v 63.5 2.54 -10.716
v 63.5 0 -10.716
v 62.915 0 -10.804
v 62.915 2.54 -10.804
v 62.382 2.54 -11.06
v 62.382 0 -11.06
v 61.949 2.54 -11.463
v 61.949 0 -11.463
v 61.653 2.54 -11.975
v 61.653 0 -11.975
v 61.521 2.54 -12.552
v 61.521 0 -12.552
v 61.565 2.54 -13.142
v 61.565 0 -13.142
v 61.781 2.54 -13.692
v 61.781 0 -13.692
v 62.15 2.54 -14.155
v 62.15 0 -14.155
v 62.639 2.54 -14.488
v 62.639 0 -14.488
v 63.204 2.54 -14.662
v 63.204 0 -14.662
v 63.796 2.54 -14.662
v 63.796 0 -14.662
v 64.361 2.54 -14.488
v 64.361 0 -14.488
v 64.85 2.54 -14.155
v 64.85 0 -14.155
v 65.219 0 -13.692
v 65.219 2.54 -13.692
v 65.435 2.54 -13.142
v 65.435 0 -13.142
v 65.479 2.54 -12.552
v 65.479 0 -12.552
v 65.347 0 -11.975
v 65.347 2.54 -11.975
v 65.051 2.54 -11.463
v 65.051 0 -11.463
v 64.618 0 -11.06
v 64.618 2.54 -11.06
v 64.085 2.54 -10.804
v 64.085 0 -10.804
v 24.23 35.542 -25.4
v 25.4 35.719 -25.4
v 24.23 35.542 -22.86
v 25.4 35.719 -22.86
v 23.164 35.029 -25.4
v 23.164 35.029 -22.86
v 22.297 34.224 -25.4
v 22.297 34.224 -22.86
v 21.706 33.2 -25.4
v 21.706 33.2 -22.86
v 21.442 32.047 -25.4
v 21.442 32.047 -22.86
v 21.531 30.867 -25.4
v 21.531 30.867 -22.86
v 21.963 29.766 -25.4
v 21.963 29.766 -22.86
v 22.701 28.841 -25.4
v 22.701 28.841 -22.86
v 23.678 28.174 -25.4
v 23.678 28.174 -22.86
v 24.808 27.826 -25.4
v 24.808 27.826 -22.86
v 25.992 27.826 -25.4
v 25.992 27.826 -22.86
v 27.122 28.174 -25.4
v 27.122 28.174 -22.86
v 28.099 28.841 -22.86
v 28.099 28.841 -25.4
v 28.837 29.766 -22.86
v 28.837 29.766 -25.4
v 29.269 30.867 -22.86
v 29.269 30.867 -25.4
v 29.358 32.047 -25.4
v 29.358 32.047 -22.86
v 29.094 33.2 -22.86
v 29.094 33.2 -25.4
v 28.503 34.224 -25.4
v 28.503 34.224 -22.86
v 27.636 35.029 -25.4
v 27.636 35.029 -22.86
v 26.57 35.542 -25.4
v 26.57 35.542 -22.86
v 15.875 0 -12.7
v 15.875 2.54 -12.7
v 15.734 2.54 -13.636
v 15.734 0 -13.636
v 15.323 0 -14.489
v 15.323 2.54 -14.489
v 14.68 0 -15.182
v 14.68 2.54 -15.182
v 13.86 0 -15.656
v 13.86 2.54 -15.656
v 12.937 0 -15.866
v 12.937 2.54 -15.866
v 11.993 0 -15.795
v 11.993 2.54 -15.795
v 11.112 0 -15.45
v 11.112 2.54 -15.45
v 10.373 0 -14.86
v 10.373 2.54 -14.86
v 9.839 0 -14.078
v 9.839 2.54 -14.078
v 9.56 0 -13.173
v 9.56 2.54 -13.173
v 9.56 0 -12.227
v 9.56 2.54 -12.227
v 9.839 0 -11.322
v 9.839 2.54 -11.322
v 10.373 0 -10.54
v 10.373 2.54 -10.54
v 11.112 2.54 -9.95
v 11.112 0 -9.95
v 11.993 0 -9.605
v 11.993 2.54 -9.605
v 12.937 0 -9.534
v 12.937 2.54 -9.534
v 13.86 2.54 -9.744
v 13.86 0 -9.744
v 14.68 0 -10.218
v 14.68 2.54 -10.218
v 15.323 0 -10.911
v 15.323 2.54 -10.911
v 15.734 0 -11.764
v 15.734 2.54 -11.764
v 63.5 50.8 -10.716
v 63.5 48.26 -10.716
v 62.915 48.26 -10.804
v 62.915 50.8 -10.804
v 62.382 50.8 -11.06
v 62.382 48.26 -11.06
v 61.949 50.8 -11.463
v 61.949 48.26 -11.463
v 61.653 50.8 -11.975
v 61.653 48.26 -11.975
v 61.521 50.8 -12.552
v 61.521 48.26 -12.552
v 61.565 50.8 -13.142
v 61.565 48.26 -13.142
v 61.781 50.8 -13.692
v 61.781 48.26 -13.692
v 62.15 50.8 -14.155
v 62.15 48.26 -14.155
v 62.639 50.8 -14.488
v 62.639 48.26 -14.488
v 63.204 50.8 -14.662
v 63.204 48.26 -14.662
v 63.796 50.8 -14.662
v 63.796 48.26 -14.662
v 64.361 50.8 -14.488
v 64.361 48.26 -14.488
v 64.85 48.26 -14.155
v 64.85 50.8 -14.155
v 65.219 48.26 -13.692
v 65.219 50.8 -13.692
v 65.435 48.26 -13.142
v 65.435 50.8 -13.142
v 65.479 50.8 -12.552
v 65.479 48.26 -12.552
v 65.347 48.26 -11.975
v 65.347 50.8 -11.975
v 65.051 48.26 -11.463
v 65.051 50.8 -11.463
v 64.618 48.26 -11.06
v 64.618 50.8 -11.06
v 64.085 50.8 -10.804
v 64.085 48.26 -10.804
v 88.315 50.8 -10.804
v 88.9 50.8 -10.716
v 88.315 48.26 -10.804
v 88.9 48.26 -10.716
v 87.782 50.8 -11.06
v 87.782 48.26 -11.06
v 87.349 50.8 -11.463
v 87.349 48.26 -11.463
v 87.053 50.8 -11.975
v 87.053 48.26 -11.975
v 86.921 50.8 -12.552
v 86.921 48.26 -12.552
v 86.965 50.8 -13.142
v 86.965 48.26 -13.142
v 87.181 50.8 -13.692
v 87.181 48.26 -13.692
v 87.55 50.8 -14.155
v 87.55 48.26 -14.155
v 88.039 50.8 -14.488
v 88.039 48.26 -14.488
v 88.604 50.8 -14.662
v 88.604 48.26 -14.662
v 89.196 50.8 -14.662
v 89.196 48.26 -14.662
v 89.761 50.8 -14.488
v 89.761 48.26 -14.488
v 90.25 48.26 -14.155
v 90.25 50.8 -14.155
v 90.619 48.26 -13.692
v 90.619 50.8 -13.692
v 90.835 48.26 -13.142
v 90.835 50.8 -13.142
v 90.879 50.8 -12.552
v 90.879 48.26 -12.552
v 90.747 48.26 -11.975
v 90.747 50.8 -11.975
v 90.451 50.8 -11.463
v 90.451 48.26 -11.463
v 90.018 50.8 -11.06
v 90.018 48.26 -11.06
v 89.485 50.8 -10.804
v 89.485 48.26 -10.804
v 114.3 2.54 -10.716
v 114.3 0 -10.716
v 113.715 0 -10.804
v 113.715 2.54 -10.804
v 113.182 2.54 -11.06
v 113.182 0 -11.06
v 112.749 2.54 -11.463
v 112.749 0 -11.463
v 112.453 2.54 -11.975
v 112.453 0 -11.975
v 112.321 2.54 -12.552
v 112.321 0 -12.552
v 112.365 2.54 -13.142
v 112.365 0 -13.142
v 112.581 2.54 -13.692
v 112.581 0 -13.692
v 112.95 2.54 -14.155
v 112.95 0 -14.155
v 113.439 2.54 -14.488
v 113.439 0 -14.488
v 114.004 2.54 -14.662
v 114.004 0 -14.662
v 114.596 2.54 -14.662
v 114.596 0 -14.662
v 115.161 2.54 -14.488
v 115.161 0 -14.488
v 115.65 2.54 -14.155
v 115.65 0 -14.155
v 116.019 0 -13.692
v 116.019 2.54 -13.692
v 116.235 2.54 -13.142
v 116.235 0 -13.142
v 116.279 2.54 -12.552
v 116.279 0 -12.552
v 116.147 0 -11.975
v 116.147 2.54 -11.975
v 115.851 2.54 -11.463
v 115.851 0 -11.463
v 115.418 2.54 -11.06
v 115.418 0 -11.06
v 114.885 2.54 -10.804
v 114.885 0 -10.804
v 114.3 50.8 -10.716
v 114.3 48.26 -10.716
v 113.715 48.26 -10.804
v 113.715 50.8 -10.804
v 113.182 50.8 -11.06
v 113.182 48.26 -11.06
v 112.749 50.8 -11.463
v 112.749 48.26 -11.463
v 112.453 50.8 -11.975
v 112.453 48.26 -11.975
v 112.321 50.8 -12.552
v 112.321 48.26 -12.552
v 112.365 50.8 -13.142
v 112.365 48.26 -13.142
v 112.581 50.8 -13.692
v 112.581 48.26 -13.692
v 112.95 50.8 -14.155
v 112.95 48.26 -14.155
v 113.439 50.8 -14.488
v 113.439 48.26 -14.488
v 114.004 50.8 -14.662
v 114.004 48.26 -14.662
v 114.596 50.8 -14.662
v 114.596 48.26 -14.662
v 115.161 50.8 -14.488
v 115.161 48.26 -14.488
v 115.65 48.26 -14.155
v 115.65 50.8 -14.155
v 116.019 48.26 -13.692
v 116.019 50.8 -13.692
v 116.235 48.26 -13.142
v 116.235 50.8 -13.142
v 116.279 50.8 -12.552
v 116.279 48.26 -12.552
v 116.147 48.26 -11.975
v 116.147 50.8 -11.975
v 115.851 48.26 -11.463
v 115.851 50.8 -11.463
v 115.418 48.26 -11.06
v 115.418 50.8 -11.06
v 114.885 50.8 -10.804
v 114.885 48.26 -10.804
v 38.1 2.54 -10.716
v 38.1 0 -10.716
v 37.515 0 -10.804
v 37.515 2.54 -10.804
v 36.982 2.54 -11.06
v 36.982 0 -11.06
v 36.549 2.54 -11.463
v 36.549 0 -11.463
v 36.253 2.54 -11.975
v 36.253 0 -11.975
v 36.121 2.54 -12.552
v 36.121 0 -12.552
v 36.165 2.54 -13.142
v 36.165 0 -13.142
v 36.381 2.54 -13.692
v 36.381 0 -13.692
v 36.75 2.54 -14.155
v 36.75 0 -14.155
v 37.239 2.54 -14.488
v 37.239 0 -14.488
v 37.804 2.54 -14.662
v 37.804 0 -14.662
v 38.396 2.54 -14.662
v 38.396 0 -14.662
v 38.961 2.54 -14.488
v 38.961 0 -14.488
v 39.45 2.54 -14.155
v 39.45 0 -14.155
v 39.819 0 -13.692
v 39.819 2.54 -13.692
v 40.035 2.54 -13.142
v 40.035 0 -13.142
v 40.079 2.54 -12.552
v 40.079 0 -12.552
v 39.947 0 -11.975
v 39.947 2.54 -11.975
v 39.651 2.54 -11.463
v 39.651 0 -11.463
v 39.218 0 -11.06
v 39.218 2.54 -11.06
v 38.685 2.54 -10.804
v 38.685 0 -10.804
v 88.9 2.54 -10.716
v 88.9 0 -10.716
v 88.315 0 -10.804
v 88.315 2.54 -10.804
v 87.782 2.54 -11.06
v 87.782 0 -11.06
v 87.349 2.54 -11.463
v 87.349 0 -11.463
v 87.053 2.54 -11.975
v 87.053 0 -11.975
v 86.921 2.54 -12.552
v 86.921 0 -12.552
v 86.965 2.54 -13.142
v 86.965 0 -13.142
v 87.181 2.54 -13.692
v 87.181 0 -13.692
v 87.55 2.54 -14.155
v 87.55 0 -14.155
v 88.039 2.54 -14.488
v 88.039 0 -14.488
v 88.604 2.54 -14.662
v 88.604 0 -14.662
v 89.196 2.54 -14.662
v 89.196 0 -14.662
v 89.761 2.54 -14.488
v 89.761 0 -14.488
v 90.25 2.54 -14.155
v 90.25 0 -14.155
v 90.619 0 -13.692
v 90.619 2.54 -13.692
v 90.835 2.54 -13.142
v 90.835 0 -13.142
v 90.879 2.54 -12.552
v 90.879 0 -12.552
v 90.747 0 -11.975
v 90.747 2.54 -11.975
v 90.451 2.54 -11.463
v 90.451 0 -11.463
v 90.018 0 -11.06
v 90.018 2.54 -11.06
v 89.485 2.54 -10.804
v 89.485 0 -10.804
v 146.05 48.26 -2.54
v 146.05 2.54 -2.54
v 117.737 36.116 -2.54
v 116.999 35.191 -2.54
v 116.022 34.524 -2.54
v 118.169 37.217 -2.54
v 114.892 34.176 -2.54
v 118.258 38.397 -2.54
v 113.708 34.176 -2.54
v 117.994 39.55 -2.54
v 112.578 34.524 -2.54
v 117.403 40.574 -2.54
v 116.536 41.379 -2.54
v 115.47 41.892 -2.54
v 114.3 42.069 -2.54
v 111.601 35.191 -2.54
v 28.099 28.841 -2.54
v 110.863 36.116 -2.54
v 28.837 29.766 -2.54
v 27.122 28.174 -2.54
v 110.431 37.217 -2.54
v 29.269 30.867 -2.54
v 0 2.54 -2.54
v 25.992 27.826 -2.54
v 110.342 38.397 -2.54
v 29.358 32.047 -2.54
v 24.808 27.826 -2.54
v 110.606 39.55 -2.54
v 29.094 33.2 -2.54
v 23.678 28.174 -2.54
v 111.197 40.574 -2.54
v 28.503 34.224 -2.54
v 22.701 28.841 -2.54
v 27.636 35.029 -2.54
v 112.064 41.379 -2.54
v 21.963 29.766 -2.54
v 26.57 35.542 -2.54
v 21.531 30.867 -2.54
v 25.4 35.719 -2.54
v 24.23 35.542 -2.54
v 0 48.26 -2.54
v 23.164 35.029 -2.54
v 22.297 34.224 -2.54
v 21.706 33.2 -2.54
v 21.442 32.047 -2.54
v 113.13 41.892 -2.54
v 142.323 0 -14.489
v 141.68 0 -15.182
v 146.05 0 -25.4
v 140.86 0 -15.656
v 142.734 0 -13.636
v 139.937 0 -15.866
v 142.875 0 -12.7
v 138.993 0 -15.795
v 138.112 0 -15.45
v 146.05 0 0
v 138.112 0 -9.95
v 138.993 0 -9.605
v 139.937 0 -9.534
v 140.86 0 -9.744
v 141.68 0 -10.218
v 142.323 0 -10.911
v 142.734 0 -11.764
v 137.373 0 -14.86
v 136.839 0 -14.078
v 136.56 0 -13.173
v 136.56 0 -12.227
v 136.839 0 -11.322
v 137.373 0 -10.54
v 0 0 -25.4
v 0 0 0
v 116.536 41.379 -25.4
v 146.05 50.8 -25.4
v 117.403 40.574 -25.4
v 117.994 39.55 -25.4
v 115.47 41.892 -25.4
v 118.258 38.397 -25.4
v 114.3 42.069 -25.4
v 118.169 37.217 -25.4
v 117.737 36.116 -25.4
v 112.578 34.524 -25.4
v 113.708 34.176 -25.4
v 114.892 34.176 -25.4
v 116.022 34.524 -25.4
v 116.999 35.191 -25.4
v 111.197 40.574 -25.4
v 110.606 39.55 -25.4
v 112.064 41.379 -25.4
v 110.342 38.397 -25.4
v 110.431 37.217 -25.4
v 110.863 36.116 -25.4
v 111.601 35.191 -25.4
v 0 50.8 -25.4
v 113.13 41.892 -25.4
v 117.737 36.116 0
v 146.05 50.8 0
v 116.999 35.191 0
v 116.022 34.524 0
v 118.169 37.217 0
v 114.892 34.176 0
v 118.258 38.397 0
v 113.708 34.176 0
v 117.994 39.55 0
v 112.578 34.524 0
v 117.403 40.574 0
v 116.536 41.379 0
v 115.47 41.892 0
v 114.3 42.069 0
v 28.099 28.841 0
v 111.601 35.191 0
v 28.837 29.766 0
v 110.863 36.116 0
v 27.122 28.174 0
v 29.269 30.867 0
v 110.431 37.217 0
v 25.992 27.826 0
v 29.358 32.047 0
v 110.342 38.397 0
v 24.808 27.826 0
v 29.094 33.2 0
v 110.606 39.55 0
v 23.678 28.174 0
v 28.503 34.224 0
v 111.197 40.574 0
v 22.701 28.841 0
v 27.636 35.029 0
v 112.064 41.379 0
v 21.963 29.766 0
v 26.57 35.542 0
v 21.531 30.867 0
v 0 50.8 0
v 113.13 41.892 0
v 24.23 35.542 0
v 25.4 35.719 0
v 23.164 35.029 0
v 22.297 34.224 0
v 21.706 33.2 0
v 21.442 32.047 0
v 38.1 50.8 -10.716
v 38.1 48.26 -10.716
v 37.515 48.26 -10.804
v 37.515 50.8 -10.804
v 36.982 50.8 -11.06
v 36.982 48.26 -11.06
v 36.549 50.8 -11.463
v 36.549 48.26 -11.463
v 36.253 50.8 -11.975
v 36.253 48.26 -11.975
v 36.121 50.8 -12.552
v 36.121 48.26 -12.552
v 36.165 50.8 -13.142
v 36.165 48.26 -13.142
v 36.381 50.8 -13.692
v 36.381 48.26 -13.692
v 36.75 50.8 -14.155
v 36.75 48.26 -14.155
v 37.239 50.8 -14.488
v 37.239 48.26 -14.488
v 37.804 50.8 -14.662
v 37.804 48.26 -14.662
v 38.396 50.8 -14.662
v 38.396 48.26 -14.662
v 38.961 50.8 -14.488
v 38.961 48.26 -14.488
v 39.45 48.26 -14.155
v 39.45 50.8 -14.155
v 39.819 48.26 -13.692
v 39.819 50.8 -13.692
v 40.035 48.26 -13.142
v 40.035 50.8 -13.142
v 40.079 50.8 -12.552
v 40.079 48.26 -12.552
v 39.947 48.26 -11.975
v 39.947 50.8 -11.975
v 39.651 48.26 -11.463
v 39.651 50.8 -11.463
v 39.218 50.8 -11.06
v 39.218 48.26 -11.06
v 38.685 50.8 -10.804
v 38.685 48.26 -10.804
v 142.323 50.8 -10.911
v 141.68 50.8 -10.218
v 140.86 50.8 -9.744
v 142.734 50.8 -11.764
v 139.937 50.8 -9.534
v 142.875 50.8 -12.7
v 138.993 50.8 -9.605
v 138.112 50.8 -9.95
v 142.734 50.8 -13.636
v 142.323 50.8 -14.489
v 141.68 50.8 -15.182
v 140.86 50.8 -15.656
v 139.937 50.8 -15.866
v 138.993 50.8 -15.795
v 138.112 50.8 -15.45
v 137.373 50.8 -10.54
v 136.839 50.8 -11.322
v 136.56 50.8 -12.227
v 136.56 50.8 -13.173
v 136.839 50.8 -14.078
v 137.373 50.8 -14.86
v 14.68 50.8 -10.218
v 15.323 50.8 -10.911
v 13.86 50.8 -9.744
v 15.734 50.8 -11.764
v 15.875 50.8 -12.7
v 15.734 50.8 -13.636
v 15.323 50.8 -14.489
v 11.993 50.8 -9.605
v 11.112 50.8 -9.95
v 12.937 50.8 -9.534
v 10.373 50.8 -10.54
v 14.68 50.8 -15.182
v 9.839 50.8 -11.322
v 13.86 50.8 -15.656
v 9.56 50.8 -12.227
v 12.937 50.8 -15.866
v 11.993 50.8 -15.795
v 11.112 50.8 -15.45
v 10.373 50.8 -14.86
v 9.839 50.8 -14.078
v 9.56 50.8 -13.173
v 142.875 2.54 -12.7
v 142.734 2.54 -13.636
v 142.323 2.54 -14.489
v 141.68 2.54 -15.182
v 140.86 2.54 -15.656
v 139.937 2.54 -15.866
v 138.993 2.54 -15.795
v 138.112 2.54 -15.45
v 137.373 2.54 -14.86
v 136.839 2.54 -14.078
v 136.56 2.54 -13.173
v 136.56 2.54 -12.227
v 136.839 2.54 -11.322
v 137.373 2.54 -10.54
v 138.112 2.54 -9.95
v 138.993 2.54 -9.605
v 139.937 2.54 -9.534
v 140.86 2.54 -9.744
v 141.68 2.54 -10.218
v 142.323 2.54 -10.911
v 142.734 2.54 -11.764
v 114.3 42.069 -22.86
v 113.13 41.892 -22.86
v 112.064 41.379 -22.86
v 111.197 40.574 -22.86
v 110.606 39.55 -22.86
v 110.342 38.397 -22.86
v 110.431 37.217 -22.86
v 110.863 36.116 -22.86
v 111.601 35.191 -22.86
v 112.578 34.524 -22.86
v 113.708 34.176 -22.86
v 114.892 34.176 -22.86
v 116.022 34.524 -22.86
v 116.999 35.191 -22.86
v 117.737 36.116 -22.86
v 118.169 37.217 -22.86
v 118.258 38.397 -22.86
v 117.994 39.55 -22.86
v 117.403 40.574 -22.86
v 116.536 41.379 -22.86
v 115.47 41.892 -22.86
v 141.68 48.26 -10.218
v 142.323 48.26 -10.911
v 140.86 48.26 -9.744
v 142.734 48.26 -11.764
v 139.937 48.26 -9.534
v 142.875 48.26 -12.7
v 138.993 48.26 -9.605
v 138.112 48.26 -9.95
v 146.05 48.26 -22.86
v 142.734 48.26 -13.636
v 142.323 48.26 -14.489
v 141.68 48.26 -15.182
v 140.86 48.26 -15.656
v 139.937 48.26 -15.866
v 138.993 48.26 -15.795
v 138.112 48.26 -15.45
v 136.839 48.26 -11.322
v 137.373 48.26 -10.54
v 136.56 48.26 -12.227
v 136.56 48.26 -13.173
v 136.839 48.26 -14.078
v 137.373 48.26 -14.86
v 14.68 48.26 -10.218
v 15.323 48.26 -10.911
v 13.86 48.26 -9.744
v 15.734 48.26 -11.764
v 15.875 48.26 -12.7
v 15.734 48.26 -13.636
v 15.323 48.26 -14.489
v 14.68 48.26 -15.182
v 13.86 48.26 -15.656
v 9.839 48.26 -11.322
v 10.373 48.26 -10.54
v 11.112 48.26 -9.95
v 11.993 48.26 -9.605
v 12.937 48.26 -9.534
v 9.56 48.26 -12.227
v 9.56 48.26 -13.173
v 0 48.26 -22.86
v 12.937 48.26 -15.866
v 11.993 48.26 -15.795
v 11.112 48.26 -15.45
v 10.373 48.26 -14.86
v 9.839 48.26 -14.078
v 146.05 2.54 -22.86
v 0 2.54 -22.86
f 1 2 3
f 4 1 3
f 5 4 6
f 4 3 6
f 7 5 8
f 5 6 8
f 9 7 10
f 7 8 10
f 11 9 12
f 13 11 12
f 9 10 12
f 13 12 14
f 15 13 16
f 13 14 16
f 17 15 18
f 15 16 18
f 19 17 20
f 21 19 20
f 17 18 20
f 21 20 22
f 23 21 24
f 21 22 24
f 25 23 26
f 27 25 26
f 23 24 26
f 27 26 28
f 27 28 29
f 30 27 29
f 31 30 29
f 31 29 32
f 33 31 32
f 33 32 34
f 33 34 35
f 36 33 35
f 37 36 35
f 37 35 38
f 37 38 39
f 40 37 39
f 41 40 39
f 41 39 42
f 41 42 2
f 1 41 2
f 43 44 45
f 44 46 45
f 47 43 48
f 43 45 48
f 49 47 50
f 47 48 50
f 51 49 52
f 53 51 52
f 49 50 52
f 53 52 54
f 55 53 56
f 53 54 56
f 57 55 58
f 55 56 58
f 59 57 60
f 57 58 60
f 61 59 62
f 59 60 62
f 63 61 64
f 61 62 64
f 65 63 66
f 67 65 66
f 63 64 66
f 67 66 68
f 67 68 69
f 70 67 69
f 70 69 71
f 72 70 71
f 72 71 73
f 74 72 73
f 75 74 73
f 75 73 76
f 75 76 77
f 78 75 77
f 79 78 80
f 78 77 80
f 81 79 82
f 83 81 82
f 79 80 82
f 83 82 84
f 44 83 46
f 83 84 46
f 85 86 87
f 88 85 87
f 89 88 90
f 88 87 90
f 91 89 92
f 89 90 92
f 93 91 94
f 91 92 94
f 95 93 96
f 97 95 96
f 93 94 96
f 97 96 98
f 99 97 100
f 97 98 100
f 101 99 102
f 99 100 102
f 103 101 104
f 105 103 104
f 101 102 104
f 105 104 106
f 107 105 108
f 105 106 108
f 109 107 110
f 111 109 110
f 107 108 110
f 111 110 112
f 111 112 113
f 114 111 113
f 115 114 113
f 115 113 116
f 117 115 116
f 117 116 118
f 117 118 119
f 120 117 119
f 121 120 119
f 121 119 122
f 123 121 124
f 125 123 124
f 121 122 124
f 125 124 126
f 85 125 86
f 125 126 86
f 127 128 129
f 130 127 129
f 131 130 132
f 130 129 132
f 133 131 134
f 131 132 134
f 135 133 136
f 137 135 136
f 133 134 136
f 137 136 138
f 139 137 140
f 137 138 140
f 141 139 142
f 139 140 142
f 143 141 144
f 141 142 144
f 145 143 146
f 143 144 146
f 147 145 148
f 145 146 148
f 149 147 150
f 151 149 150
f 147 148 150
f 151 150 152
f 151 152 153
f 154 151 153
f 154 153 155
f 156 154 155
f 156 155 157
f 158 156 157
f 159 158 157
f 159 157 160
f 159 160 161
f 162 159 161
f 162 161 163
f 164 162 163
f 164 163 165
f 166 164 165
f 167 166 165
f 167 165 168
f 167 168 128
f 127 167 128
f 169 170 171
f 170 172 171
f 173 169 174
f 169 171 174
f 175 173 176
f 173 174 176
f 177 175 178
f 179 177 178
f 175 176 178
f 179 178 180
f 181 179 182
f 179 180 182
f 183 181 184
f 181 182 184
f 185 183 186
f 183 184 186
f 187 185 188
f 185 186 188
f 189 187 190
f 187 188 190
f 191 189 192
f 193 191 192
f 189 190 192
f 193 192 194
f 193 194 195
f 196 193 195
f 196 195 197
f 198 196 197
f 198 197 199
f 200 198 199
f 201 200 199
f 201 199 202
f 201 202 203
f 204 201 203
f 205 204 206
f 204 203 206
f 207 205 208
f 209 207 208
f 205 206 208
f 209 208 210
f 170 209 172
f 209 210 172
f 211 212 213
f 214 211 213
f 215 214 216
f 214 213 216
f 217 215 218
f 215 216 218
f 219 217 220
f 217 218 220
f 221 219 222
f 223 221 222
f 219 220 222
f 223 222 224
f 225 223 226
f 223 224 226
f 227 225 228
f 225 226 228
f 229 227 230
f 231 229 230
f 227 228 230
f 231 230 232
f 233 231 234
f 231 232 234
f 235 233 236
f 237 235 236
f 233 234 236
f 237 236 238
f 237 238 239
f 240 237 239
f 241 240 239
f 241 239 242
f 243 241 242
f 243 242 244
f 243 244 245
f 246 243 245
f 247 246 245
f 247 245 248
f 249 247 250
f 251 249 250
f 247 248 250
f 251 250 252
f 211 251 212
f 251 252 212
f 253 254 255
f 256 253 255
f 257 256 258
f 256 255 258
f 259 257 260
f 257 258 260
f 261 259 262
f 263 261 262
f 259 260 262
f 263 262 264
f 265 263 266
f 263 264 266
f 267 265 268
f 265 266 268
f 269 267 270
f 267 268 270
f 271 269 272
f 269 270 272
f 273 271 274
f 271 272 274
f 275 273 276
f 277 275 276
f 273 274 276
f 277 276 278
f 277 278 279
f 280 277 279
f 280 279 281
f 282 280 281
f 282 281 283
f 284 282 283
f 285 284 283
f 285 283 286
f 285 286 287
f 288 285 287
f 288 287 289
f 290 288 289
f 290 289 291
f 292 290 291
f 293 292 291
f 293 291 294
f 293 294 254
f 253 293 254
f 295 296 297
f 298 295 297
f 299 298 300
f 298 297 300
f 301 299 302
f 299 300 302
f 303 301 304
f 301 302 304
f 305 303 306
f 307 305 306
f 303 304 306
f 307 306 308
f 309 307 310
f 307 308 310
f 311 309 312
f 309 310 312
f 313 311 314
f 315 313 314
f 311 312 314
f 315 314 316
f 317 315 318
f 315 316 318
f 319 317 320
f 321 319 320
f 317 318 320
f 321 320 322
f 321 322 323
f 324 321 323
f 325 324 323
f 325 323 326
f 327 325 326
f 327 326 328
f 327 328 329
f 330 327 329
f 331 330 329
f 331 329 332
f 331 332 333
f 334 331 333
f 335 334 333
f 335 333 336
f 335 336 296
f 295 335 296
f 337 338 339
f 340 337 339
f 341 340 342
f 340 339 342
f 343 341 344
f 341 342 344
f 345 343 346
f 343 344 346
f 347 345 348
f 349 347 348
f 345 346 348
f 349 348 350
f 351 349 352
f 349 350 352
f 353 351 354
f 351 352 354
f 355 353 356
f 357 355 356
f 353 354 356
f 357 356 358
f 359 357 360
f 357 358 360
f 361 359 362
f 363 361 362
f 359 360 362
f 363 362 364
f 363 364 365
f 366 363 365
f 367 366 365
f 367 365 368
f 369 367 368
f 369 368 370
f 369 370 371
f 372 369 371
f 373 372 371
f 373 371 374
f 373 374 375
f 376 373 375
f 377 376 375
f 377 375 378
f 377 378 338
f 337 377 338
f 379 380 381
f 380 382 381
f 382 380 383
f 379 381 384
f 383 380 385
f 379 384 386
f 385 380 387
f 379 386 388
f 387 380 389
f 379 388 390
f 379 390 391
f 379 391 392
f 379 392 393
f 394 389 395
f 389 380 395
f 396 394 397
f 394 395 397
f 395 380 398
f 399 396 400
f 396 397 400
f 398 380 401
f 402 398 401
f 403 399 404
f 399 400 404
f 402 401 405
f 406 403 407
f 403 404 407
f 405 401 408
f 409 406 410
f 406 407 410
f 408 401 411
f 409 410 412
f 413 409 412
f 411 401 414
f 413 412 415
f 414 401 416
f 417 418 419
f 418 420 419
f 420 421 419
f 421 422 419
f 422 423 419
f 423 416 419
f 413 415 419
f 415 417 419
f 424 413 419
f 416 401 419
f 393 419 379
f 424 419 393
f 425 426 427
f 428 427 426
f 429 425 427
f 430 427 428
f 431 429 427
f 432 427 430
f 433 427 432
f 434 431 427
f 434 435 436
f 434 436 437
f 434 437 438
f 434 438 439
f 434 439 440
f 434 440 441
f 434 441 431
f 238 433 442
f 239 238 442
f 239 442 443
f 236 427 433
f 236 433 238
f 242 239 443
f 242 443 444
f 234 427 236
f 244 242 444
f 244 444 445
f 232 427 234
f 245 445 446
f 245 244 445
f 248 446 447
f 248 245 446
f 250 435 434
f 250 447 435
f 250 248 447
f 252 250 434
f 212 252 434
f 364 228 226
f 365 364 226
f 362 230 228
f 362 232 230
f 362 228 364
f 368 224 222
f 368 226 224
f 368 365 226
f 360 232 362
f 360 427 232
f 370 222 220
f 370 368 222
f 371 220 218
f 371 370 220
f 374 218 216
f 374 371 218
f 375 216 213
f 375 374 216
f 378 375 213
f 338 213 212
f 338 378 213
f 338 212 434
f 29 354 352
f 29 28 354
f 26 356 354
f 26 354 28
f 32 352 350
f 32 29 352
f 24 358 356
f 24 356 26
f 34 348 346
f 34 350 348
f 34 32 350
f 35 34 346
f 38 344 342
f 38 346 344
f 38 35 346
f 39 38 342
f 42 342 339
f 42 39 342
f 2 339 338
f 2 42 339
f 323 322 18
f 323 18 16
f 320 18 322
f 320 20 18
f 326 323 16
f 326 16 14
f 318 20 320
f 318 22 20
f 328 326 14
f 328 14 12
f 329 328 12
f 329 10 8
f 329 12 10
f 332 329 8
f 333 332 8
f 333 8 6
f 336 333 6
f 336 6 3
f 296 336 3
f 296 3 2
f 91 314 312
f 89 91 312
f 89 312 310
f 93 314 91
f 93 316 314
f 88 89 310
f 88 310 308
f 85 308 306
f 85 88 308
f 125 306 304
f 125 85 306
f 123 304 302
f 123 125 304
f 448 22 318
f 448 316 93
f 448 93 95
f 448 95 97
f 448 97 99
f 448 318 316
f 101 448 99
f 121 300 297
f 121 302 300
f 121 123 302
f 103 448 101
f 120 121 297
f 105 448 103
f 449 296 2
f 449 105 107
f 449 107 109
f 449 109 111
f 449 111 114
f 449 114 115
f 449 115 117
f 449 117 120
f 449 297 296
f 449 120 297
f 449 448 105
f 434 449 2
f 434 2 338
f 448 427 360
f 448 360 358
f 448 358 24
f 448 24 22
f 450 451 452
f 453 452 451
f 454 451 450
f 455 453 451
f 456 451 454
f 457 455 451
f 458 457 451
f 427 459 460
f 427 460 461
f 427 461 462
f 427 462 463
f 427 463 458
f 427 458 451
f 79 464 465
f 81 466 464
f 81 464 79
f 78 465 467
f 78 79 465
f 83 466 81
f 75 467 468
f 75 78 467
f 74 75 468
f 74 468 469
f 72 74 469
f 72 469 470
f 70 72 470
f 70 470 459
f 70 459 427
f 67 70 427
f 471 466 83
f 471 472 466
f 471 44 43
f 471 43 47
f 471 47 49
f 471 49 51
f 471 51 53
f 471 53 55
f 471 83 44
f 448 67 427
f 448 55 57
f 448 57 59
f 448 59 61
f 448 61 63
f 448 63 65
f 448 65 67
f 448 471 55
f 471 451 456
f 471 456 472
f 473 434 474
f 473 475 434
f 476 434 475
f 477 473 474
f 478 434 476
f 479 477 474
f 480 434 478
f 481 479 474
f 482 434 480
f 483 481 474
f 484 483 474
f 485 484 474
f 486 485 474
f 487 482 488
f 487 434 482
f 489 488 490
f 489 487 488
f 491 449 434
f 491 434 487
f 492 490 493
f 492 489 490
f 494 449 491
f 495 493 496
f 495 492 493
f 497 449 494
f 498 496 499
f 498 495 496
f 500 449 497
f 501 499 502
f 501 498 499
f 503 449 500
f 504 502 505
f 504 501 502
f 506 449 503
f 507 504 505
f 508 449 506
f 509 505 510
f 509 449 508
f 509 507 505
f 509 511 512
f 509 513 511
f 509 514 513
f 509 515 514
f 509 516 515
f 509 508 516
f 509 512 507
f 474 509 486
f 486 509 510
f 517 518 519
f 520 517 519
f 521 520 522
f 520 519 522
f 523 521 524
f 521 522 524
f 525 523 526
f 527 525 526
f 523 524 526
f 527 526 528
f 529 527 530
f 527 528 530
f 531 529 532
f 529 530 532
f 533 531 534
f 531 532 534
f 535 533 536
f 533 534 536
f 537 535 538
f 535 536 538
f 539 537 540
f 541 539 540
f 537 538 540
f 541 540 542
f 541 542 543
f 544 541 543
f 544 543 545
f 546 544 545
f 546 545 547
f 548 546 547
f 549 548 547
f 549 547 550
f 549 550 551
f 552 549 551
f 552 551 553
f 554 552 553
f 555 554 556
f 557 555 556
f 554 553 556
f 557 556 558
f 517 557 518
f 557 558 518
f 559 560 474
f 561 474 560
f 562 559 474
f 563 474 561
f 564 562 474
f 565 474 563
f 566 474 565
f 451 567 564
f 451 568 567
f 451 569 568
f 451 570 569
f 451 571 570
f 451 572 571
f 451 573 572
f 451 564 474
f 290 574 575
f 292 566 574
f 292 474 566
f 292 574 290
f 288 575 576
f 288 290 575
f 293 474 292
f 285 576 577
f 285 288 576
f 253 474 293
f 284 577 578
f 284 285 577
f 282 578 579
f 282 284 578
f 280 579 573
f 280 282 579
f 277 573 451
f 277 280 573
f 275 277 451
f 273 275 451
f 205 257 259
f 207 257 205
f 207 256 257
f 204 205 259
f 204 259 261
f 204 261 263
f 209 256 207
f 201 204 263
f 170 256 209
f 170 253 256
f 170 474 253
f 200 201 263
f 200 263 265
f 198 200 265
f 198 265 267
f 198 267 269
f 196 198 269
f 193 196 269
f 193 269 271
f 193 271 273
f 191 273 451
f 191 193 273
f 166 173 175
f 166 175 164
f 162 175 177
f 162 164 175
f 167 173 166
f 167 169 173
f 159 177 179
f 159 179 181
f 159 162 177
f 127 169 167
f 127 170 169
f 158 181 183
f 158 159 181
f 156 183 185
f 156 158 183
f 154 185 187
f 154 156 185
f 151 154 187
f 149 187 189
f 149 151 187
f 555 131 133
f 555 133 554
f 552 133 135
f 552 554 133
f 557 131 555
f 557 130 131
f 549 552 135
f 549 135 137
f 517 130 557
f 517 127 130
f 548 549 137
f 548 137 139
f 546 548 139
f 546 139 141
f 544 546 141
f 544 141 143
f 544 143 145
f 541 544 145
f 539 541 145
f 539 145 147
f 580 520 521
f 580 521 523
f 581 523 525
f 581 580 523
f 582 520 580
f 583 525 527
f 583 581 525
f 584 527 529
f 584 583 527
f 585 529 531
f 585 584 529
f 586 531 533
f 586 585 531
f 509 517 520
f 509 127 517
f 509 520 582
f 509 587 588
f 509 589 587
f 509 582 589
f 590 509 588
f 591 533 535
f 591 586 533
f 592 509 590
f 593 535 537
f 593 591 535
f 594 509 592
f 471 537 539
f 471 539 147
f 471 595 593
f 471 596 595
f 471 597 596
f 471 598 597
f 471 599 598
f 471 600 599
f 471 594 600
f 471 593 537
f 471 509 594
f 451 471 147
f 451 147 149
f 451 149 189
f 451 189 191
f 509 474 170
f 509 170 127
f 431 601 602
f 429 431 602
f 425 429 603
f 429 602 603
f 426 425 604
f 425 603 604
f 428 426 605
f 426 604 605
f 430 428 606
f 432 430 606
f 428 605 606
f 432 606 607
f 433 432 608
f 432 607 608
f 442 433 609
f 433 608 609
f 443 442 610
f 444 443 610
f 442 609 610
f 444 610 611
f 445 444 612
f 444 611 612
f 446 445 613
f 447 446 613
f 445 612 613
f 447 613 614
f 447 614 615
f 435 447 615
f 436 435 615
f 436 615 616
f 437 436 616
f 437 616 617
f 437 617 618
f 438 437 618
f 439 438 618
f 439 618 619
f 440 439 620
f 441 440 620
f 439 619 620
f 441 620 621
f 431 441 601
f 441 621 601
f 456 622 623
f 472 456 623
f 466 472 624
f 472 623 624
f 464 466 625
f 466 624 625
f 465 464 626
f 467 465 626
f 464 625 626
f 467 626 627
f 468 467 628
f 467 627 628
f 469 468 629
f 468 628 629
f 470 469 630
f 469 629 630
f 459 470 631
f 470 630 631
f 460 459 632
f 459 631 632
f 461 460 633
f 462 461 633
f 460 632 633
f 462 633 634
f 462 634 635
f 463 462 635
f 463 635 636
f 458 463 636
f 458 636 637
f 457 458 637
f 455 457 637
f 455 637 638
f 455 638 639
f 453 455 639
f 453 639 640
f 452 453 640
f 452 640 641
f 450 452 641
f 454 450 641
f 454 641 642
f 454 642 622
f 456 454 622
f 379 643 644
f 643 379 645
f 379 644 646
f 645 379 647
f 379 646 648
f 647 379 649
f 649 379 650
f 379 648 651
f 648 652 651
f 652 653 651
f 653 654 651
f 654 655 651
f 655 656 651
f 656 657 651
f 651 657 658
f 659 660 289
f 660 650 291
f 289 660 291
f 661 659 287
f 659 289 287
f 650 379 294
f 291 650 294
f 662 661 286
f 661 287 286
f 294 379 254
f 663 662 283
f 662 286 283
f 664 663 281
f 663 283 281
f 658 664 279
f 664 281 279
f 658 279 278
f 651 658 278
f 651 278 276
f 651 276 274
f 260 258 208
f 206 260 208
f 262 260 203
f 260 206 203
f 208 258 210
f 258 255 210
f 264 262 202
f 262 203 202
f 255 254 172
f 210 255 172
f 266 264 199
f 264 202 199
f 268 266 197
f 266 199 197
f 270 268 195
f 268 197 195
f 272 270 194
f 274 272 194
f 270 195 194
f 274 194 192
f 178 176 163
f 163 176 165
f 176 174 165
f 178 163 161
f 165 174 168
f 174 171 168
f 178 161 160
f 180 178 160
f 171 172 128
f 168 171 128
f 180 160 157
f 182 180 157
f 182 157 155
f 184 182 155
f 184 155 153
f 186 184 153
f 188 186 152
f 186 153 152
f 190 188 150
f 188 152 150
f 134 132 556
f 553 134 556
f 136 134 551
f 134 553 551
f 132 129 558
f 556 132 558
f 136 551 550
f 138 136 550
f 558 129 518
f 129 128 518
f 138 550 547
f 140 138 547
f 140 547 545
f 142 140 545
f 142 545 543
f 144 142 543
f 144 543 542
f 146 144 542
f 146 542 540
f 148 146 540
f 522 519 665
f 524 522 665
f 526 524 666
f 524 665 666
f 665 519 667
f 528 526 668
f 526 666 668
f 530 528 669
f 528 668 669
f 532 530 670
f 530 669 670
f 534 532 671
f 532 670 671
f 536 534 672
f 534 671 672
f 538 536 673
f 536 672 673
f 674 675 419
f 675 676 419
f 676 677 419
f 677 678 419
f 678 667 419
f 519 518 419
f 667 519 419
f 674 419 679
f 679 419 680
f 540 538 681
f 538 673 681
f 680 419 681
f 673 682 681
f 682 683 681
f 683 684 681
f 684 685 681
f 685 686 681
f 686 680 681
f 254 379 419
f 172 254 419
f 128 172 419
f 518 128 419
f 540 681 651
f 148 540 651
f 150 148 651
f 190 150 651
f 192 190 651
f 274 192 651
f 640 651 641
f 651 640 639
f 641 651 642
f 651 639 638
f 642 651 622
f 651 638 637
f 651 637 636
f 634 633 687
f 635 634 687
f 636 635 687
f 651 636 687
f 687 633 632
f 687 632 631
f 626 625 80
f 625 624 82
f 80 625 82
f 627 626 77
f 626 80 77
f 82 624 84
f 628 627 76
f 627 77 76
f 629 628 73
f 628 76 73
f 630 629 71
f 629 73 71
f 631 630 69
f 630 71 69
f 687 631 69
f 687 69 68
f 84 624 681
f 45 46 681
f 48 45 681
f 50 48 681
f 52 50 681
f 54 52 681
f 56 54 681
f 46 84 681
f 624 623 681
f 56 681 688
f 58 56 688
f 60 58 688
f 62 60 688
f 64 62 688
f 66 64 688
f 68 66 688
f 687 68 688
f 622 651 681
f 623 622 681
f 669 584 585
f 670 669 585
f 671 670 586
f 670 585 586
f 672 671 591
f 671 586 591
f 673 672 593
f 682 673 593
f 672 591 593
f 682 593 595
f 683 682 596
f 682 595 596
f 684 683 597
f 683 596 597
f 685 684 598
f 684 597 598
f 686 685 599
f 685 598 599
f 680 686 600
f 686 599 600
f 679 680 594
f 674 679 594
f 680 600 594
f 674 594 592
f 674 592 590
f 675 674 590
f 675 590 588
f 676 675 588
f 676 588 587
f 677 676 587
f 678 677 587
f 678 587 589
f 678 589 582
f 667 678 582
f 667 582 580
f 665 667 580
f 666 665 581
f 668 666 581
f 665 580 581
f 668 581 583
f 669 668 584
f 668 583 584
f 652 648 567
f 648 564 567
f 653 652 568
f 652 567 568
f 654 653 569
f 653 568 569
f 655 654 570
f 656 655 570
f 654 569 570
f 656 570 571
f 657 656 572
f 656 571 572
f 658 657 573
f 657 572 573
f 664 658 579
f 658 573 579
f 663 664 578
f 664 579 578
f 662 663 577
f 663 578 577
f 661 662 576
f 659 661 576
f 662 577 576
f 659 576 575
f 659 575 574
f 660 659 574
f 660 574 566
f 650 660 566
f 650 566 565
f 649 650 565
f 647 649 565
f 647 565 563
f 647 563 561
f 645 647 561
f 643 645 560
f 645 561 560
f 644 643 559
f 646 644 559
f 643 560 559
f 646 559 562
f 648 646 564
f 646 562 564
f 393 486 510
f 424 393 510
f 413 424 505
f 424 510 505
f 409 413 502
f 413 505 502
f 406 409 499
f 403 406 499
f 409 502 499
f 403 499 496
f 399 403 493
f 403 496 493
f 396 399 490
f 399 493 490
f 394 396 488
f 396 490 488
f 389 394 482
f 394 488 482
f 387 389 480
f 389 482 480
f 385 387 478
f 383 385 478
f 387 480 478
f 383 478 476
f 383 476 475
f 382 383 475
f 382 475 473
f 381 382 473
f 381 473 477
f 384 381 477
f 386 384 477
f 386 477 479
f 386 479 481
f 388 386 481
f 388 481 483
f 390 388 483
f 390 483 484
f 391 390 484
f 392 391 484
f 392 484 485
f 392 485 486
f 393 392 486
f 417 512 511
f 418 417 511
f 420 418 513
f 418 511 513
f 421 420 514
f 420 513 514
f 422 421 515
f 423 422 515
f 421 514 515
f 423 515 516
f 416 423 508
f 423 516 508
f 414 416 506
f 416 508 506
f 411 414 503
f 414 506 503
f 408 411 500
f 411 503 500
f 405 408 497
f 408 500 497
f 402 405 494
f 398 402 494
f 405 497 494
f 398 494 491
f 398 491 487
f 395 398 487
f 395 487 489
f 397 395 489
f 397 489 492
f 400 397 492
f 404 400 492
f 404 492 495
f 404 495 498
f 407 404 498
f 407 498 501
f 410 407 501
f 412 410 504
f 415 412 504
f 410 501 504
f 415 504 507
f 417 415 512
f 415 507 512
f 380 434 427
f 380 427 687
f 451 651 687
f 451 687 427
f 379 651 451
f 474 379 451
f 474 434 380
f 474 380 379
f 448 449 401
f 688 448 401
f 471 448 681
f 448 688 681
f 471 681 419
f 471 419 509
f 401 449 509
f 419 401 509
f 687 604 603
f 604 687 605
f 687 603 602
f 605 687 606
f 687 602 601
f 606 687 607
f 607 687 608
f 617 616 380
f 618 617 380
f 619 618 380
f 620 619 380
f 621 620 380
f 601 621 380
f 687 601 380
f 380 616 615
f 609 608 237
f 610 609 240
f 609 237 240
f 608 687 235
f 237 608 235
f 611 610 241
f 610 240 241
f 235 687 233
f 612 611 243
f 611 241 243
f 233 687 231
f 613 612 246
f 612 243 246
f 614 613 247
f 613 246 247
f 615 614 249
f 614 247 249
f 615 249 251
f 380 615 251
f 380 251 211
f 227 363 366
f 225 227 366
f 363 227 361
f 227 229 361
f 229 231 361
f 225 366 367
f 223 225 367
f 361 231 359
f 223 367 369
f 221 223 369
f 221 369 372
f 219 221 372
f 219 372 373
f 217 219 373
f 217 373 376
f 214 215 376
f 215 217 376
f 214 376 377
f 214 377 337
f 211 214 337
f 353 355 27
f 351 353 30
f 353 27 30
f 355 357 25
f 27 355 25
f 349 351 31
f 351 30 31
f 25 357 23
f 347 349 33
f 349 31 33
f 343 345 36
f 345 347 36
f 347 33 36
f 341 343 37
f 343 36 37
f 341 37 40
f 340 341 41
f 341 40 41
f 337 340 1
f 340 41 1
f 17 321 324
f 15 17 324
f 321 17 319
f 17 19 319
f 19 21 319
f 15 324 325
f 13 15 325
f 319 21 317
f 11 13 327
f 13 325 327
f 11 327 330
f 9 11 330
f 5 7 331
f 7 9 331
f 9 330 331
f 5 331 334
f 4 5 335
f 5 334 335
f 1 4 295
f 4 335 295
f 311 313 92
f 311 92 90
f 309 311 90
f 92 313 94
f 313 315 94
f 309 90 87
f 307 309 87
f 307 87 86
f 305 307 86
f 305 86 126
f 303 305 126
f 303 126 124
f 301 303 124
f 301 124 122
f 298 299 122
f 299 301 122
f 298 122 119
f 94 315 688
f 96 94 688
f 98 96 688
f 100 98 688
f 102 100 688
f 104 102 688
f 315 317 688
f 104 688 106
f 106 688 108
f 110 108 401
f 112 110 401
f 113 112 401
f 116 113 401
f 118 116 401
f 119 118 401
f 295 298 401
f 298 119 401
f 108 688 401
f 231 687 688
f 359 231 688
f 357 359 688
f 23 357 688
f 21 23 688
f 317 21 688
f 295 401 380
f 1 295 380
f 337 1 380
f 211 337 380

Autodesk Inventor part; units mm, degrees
ref_plane "YZ Plane" through (0, 0, 0) normal (1, 0, 0) x (0, 1, 0)
ref_plane "XZ Plane" through (0, 0, 0) normal (0, 1, 0) x (-1, 0, 0)
ref_plane "XY Plane" through (0, 0, 0) normal (0, 0, 1) x (1, 0, 0)
sketch "Sketch1" plane through (0, 0, 0) normal (1, 0, 0) x (0, 1, 0)
  line L0 (0, 0) -> (50.8, 0)
  line L1 (50.8, 0) -> (50.8, -25.4)
  line L2 (50.8, -25.4) -> (0, -25.4)
  line L3 (0, -25.4) -> (0, 0)
  line L4 (2.54, -2.54) -> (48.26, -2.54)
  line L5 (48.26, -2.54) -> (48.26, -22.86)
  line L6 (48.26, -22.86) -> (2.54, -22.86)
  line L7 (2.54, -22.86) -> (2.54, -2.54)
  dimension "d0" = 50.8
  dimension "d1" = 25.4
  dimension "d2" = 45.72
  dimension "d3" = 20.32
  dimension "d4" = 2.54
  dimension "d5" = 2.54
extrude "Extrusion1" add sketch "Sketch1" along normal blind 146.05
sketch "Sketch5" plane through (0, 50.8, 0) normal (0, 1, 0) x (1, 0, 0)
  line L0 (0, 0) -> (0, 25.4) projected
  line L1 (0, 0) -> (146.05, 0) projected
  line L2 (146.05, 25.4) -> (146.05, 0) projected
  line L3 (0, 25.4) -> (146.05, 25.4) projected
  point P0 (12.7, 12.7)
  dimension "d39" = 12.7
  dimension "d40" = 12.7
hole "Hole3" at (12.7, 50.8, -12.7) direction (0, -1, 0) diameter 3.9688 end through all
pattern_linear "Rectangular Pattern1" count 6 spacing 25.4 along (1, 0, 0) of "Hole3"
sketch "Sketch6" plane through (0, 0, -25.4) normal (0, 0, -1) x (-1, 0, 0)
  line L0 (0, 50.8) -> (0, 0) projected
  line L1 (0, 50.8) -> (-146.05, 50.8) projected
  line L2 (-146.05, 0) -> (-146.05, 50.8) projected
  line L3 (0, 0) -> (-146.05, 0) projected
  point P0 (-114.3, 38.1)
  dimension "d51" = 12.7
  dimension "d52" = 31.75
hole "Hole4" at (114.3, 38.1, -25.4) direction (0, 0, 1) diameter 7.9375 end through all
sketch "Sketch7" plane through (0, 50.8, 0) normal (0, 1, 0) x (1, 0, 0)
  circle A0 centre (139.7, 12.7) radius 1.9844 projected
  circle A1 centre (114.3, 12.7) radius 1.9844 projected
  circle A2 centre (88.9, 12.7) radius 1.9844 projected
  circle A3 centre (63.5, 12.7) radius 1.9844 projected
  circle A4 centre (38.1, 12.7) radius 1.9844 projected
  circle A5 centre (12.7, 12.7) radius 1.9844 projected
  line L0 (0, 0) -> (0, 25.4) projected
  line L1 (0, 0) -> (146.05, 0) projected
  line L2 (146.05, 25.4) -> (146.05, 0) projected
  line L3 (0, 25.4) -> (146.05, 25.4) projected
  circle A6 centre (12.7, 12.7) radius 1.9844 projected
  circle A7 centre (12.7, 12.7) radius 3.175
  circle A8 centre (139.7, 12.7) radius 3.175
  dimension "d60" = 6.35
  dimension "d61" = 6.35
extrude "Extrusion3" cut sketch "Sketch7" against normal blind 50.8 contours A7 | A8
sketch "Sketch8" plane through (0, 0, -25.4) normal (0, 0, -1) x (-1, 0, 0)
  circle A0 centre (-114.3, 38.1) radius 3.9687 projected
  line L0 (0, 50.8) -> (0, 0) projected
  line L1 (0, 50.8) -> (-146.05, 50.8) projected
  line L2 (-146.05, 0) -> (-146.05, 50.8) projected
  line L3 (0, 0) -> (-146.05, 0) projected
  point P0 (-25.4, 31.75)
  dimension "d64" = 19.05
  dimension "d65" = 25.4
hole "Hole5" at (25.4, 31.75, -25.4) direction (0, 0, 1) diameter 7.9375 end through all
properties part number "frame_front_bumper"
